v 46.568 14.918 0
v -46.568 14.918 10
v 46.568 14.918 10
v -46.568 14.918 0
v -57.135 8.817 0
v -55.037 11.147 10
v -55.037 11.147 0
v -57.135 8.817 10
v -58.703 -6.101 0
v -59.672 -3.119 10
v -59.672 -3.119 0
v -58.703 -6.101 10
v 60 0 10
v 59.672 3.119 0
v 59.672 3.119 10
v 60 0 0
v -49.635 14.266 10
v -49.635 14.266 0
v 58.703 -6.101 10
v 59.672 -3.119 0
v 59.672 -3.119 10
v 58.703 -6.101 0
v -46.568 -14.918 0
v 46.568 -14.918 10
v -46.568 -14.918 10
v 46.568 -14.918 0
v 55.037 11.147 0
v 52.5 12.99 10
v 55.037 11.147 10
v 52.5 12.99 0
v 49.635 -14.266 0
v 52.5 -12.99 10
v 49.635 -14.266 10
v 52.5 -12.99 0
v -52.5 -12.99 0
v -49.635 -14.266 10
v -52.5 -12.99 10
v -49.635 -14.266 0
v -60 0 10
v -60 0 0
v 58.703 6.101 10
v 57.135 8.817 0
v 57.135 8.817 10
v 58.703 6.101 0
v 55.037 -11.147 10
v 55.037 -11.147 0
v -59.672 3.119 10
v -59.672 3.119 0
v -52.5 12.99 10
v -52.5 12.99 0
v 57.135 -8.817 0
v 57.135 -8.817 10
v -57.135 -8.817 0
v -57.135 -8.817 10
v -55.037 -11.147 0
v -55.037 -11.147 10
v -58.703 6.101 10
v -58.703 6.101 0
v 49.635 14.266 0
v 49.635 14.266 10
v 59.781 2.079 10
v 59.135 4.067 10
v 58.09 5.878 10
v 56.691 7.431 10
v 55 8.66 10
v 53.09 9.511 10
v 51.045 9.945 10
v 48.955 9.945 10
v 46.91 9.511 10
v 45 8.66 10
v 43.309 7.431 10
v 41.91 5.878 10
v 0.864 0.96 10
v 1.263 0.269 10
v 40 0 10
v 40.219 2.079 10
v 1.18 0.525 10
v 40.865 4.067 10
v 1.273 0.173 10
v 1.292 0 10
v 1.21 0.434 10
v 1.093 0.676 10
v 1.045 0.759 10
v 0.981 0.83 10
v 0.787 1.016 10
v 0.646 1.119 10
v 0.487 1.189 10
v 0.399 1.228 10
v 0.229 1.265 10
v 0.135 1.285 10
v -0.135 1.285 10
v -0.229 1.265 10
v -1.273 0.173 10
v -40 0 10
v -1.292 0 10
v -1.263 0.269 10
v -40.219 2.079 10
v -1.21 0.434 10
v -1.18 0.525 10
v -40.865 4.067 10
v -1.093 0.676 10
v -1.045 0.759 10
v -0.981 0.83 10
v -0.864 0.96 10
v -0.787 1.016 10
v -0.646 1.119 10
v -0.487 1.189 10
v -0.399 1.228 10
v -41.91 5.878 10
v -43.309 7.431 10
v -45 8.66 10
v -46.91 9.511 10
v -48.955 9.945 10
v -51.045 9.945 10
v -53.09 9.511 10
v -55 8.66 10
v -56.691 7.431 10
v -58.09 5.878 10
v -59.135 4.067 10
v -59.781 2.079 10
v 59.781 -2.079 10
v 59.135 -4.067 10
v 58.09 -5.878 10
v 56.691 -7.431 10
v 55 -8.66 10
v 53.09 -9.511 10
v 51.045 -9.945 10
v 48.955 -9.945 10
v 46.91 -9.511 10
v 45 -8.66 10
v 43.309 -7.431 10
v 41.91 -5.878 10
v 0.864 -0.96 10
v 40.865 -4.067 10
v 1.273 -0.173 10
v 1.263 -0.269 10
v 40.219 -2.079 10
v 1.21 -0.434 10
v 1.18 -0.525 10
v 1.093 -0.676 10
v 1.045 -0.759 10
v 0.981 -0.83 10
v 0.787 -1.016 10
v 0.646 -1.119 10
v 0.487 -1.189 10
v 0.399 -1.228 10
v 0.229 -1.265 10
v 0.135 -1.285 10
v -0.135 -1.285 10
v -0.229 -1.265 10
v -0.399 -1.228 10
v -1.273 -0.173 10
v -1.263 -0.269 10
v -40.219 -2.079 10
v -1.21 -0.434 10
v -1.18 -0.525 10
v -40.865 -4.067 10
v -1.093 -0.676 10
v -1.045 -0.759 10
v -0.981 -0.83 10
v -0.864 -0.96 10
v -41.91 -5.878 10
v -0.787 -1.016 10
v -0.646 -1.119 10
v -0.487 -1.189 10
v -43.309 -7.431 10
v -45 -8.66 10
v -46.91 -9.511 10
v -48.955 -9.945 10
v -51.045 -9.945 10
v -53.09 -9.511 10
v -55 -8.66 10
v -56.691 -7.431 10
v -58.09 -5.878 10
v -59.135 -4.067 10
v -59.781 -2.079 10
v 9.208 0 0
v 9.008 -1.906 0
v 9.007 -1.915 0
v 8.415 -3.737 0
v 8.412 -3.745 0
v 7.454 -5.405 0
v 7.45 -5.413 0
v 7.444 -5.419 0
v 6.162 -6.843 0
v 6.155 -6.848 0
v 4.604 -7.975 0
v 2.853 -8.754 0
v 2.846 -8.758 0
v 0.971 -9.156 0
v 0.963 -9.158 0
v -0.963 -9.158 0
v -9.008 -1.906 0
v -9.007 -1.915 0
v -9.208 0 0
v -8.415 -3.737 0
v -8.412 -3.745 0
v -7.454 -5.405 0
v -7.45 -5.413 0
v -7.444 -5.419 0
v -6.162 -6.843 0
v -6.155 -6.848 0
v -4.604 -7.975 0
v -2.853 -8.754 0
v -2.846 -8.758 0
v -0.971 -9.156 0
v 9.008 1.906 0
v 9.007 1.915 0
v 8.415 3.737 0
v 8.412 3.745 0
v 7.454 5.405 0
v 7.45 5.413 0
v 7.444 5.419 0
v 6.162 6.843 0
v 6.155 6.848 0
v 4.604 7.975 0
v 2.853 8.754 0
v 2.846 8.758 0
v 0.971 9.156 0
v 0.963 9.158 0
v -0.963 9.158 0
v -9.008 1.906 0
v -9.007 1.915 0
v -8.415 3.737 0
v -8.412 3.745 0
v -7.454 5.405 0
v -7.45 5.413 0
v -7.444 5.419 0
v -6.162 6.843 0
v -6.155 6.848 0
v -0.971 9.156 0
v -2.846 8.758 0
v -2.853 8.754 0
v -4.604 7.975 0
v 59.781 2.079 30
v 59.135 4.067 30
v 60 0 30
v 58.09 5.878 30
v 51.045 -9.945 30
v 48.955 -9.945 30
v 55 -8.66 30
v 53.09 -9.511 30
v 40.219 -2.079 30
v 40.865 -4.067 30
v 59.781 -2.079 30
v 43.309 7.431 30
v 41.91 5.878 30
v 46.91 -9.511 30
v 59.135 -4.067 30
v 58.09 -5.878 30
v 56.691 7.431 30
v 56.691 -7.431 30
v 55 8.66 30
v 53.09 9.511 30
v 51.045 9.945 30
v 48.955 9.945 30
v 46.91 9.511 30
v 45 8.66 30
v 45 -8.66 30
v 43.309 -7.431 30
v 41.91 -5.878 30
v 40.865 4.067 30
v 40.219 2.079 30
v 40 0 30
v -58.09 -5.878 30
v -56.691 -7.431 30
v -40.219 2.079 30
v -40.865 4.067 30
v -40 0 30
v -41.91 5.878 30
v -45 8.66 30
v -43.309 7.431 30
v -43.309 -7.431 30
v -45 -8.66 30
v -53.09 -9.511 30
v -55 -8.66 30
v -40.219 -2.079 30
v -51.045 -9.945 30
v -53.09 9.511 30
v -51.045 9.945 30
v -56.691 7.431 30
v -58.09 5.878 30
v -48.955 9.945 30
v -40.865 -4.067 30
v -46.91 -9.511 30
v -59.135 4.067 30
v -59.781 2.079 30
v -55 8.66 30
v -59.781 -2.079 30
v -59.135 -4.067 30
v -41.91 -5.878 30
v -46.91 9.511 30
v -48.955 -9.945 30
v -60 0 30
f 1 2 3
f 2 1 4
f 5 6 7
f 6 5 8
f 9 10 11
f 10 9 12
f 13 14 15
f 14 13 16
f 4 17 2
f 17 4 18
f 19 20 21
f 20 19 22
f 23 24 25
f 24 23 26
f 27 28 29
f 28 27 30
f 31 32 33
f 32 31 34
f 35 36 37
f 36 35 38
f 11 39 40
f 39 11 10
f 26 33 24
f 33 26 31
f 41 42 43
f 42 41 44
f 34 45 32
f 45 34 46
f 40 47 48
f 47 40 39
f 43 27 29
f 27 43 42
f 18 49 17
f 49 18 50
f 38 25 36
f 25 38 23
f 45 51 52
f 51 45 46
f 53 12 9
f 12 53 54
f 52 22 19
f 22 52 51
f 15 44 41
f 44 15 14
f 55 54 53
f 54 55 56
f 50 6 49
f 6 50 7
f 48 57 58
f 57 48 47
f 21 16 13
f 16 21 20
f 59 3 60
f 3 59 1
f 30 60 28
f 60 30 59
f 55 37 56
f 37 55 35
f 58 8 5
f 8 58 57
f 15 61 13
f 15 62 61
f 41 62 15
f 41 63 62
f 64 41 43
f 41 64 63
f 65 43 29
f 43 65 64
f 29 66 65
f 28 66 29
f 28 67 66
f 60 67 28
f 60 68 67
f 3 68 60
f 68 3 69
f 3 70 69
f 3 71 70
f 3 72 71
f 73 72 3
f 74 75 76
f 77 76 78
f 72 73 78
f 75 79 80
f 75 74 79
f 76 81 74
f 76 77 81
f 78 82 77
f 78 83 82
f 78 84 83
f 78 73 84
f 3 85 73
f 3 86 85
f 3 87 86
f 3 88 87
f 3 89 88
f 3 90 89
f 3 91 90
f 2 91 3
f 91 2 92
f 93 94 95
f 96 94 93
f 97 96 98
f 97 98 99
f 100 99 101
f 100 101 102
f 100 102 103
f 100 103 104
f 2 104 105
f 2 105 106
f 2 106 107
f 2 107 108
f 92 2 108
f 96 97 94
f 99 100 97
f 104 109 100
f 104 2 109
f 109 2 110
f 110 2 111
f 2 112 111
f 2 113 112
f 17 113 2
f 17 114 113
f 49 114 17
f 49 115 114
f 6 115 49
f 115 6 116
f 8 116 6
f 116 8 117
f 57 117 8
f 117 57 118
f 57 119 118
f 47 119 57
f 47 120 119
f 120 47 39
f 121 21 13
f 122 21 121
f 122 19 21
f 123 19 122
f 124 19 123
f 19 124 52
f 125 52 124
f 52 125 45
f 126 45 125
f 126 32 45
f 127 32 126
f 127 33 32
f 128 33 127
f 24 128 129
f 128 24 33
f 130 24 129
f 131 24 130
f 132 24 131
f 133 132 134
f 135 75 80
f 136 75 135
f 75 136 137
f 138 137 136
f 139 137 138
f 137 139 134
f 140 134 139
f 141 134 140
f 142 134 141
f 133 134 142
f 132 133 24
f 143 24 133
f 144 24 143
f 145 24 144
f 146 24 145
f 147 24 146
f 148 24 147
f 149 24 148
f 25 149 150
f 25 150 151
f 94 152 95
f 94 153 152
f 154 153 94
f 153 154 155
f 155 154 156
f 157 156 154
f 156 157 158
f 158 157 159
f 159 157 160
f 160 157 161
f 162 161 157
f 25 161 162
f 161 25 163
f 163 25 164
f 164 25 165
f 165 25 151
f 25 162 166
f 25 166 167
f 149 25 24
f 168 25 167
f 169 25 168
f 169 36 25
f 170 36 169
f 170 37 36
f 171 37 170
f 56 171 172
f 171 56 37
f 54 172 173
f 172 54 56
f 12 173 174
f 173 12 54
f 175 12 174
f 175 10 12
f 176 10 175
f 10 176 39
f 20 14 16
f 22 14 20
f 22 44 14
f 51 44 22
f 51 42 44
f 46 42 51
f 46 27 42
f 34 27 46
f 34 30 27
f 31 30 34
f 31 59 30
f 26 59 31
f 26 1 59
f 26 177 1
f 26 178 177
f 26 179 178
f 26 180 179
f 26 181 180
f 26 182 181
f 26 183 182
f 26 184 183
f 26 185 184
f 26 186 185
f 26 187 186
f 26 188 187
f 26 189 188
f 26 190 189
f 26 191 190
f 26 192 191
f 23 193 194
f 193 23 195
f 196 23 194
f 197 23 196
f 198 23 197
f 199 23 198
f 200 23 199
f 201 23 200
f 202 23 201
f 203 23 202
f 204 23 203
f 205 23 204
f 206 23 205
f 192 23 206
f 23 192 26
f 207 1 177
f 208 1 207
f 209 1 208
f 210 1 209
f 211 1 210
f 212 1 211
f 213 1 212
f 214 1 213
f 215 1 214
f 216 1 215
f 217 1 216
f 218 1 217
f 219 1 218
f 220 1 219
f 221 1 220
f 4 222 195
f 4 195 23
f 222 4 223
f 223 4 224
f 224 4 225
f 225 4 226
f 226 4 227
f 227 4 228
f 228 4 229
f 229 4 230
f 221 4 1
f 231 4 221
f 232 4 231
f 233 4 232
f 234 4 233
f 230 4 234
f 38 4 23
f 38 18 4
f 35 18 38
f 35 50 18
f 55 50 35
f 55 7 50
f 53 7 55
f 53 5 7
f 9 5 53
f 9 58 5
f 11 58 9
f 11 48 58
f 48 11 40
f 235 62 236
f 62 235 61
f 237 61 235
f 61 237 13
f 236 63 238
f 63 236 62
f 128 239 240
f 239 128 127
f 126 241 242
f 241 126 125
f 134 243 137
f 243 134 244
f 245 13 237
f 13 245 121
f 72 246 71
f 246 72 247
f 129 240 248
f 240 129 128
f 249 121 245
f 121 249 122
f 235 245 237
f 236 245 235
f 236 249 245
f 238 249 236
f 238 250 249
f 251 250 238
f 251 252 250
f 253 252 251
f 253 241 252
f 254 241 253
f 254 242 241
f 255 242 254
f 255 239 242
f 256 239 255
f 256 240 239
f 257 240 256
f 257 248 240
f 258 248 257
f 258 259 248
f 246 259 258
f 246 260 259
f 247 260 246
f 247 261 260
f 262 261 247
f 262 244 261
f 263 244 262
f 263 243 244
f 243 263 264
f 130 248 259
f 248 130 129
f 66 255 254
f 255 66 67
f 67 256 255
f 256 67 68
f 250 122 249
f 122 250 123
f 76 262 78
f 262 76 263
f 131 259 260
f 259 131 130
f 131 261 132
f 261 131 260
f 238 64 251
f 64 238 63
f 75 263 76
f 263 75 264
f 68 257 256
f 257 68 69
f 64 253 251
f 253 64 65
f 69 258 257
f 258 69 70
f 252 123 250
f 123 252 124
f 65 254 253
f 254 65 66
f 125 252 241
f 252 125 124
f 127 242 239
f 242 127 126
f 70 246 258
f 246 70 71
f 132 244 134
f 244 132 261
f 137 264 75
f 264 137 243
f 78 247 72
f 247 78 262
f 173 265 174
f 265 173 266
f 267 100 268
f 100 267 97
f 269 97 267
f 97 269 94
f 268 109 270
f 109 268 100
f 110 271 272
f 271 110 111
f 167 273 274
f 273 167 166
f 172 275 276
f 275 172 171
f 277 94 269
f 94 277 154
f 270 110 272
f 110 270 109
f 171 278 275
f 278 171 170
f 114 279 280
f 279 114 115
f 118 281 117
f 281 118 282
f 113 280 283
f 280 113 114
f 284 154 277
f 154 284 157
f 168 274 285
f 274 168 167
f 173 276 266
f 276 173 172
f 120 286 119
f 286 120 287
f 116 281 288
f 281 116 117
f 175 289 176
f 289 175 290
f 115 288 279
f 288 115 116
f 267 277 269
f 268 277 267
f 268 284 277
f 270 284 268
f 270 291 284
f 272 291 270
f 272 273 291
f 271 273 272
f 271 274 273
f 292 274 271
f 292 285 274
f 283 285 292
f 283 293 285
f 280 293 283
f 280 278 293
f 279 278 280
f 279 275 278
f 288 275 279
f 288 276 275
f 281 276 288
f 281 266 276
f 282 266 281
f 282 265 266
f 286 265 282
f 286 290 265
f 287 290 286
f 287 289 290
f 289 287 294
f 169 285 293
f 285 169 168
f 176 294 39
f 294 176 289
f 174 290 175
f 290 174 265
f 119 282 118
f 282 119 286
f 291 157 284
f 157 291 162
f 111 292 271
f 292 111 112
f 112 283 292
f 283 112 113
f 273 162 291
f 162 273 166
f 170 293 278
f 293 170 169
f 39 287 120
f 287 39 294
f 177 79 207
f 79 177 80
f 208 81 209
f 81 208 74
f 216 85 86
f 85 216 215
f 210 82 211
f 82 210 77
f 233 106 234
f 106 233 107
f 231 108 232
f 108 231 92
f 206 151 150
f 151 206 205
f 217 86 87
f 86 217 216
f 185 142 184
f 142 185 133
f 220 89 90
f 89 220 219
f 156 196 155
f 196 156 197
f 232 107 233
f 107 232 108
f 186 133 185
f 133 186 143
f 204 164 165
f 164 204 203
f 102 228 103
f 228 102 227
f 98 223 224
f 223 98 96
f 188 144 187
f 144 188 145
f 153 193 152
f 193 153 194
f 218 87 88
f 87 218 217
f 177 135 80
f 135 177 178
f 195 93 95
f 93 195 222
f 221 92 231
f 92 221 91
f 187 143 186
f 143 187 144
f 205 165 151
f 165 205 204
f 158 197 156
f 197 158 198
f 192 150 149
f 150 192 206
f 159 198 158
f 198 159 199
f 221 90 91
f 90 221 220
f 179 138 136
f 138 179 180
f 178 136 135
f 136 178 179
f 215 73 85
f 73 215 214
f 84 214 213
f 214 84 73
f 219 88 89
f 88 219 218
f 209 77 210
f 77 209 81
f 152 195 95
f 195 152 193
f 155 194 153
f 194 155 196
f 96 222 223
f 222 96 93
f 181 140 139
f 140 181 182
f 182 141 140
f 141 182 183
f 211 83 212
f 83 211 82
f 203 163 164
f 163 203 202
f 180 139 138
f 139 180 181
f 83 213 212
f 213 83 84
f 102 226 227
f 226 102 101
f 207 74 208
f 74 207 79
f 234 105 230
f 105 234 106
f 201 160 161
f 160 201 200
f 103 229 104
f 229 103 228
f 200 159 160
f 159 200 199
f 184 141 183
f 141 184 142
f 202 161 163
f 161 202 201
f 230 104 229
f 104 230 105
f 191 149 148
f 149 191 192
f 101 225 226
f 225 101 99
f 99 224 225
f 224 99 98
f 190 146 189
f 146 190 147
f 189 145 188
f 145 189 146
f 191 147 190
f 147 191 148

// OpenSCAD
difference(){
    union(){
        hull(){
            translate([45,0,0]) cylinder(r=15,h=10);
            translate([-45,0,0]) cylinder(r=15,h=10);
        }
        translate([50,0,0]) cylinder(r=10,h=30);
        translate([-50,0,0]) cylinder(r=10,h=30);
    }
    translate([0,0,-1]) cylinder(r2=0.5,r1=10,h=12);
}
